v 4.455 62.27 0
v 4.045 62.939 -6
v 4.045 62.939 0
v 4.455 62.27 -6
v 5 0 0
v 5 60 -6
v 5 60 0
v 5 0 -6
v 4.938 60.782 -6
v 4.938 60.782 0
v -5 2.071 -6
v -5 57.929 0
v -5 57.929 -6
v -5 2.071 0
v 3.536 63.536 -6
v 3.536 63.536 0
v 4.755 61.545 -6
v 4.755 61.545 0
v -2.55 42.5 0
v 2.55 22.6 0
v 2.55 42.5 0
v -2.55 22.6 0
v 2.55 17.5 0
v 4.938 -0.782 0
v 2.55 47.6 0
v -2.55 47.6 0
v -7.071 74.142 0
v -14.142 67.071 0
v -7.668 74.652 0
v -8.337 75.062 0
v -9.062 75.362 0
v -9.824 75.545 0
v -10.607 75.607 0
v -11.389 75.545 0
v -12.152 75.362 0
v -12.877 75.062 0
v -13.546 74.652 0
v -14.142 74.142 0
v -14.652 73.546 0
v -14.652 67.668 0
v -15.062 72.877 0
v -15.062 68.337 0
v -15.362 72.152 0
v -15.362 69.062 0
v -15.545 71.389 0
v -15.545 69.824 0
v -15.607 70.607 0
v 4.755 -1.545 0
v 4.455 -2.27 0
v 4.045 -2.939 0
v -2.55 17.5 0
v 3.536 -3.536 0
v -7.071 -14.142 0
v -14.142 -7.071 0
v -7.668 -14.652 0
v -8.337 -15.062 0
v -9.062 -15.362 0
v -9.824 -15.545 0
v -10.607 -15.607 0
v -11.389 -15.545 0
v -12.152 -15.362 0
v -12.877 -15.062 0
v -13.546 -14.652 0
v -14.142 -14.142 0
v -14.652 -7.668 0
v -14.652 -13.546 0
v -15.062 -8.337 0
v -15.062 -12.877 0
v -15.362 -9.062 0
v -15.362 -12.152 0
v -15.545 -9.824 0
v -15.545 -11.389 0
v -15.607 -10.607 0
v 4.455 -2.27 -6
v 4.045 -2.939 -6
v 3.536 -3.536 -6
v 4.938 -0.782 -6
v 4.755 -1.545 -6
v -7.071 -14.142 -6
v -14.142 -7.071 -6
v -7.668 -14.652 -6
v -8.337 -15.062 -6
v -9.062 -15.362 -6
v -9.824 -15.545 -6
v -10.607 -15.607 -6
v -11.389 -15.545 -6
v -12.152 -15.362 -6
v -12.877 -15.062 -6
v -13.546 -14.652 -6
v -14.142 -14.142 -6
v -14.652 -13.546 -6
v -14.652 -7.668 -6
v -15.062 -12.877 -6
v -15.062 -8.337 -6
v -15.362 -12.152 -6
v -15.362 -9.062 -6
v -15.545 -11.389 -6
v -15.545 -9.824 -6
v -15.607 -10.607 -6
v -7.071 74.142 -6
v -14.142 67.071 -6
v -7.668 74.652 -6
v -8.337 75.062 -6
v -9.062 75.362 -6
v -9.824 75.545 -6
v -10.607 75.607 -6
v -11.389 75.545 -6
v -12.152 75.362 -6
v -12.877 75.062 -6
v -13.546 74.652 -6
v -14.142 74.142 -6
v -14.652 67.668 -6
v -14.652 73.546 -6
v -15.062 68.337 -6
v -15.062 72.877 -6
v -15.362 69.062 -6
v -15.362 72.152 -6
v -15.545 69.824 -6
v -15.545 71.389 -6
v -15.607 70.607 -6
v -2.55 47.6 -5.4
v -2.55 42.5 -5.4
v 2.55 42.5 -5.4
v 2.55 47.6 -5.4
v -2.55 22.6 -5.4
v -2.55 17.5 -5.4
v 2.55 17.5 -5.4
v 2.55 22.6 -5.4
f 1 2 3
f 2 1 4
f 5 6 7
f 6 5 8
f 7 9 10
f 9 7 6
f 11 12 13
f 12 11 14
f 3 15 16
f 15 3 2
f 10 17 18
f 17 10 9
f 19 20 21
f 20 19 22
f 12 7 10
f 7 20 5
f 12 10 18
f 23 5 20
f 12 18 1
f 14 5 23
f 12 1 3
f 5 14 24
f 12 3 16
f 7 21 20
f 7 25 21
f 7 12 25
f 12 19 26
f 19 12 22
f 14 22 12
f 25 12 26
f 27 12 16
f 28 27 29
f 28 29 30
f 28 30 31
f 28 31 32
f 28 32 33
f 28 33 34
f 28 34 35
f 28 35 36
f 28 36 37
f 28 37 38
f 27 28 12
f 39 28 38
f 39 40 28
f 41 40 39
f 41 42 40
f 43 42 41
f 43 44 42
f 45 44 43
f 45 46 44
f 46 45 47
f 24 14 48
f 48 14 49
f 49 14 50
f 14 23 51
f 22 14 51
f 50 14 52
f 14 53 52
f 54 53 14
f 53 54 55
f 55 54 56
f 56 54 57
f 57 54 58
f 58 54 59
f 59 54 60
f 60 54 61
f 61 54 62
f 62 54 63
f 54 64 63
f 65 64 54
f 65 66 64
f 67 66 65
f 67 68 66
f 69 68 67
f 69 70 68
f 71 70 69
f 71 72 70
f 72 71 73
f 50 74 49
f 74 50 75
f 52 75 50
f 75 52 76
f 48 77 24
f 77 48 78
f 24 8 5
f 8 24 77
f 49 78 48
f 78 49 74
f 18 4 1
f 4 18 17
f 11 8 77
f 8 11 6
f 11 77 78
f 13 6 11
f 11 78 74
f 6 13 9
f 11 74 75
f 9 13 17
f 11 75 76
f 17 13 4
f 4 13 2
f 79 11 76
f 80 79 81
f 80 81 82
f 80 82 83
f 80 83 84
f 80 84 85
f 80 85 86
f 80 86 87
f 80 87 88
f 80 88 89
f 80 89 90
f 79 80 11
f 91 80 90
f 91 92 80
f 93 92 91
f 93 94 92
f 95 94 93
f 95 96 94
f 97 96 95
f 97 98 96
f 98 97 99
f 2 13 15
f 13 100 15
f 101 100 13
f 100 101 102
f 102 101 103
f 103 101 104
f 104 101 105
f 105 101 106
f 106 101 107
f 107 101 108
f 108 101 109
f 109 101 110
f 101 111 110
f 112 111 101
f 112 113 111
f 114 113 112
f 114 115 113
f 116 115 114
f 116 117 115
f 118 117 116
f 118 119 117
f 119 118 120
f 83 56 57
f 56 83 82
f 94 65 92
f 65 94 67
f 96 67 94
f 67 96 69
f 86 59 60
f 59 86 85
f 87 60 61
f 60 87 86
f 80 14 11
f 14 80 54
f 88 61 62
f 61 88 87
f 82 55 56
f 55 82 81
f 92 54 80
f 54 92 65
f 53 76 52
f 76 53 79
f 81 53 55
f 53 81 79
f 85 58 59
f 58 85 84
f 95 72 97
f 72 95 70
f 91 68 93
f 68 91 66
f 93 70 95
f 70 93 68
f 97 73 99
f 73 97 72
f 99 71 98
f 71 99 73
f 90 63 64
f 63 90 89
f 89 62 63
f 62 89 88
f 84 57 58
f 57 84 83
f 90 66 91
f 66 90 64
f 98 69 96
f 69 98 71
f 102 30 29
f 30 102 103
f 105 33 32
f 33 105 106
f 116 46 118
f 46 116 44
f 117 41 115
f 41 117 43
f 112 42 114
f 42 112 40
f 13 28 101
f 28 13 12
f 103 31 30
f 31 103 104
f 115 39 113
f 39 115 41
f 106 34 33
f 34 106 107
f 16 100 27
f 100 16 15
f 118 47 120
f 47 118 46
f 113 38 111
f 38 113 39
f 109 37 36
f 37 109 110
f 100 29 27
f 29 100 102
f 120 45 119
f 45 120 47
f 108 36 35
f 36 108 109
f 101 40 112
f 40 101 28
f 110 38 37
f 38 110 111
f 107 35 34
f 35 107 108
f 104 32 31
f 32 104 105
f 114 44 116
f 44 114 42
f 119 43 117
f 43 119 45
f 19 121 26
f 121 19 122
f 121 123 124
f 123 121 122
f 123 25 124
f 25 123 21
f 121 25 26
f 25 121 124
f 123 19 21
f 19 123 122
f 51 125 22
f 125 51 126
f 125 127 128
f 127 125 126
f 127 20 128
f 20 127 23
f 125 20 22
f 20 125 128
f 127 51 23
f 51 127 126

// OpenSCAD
//	Customizable Bobbin Thread Spool Holder
//	Copyright by Drato Lesandar - Anika Uhlemann - RobotMama

/* [Guide] */
// Height of the whole guide in mm
guideHeight = 6;
// Thickness of the whole guide in mm
guideT = 10;
// Length of the angled sides in mm
sideLength = 15;
// Length of the actual guiding part in mm
barLength = 60;
// Magnet Type (Testpieces are for fast prints, to test magnet fitting)
magType = 0; //[0:Rectangle, 1:Cylinder, 2:TestPieceCylinder, 3:TestPieceRectangle]
// Distance between the two magnets in mm
distMag = 25;

/* [Cylinder Magnets] */
// Radius of cylinder magnet in mm
cylMagRad = 5.1;
// Height of cylinder magnet in mm
cylMagHeight = 5.2;

/* [Rectangle Magnets] */
// Length of rectangle magnet in mm (part that goes along bar)
rectMagLength = 5.1;
// Width of rectangle magnet in mm (part that goes along width of bar)
rectMagWidth = 5.1;
// Height of rectangle magnet in mm
rectMagHeight = 5.4;

/* [Other] */
// How smooth the roundings are (the bigger the value the smoother)
$fn = 40;
rotate ([0,180,0])
if(magType==0 || magType==1) { // Print ready guide
    difference() {
        union() {
            sideCoords = (sideLength)/sqrt(2);
            hull() {
                cylinder(guideHeight, r = guideT/2, center = false);
                translate ([0,barLength,0])
                cylinder(guideHeight, r = guideT/2, center = false);
            }
            hull() {
                cylinder(guideHeight, r = guideT/2, center = false);
                translate ([sideCoords,-sideCoords,0])
                cylinder(guideHeight, r = guideT/2, center = false);
            }
            hull() {
                translate ([0,barLength,0])
                cylinder(guideHeight, r = guideT/2, center = false);
                translate ([sideCoords,sideCoords+barLength,0])
                cylinder(guideHeight, r = guideT/2, center = false);
            }
        }
        
        if(magType==1) { //Cylinder Hole
            translate ([0,0.5*barLength+0.5*distMag,-0.05])
            cylinder(cylMagHeight+0.05, r = cylMagRad, center = false);
            translate ([0,0.5*barLength-0.5*distMag,-0.05])
            cylinder(cylMagHeight+0.05, r = cylMagRad, center = false);
        } else { //Rectangle Hole
            translate ([-rectMagWidth*0.5,0.5*barLength+0.5*distMag,-0.05])
            cube([rectMagWidth, rectMagLength, rectMagHeight+0.05], center = false);
            translate ([-rectMagWidth*0.5,0.5*barLength-0.5*distMag,-0.05])
            cube([rectMagWidth, rectMagLength, rectMagHeight+0.05], center = false);
        } 
    }
} else { // Smaller TestPiece to test magnet fitting
    if(magType==2) { //Cylinder Hole
        difference() {
            translate ([0,0,0.05])
            cylinder(cylMagHeight+0.05+2, r = cylMagRad+1, center = false);
            cylinder(cylMagHeight+0.05, r = cylMagRad, center = false);
        }
    } else { //Rectangle Hole   
        difference() {
            translate ([-1,-1,0.05])
            cube([rectMagWidth+2, rectMagLength+2, rectMagHeight+0.05+2], center = false);      
            cube([rectMagWidth, rectMagLength, rectMagHeight+0.05], center = false);
        }
    }
}
